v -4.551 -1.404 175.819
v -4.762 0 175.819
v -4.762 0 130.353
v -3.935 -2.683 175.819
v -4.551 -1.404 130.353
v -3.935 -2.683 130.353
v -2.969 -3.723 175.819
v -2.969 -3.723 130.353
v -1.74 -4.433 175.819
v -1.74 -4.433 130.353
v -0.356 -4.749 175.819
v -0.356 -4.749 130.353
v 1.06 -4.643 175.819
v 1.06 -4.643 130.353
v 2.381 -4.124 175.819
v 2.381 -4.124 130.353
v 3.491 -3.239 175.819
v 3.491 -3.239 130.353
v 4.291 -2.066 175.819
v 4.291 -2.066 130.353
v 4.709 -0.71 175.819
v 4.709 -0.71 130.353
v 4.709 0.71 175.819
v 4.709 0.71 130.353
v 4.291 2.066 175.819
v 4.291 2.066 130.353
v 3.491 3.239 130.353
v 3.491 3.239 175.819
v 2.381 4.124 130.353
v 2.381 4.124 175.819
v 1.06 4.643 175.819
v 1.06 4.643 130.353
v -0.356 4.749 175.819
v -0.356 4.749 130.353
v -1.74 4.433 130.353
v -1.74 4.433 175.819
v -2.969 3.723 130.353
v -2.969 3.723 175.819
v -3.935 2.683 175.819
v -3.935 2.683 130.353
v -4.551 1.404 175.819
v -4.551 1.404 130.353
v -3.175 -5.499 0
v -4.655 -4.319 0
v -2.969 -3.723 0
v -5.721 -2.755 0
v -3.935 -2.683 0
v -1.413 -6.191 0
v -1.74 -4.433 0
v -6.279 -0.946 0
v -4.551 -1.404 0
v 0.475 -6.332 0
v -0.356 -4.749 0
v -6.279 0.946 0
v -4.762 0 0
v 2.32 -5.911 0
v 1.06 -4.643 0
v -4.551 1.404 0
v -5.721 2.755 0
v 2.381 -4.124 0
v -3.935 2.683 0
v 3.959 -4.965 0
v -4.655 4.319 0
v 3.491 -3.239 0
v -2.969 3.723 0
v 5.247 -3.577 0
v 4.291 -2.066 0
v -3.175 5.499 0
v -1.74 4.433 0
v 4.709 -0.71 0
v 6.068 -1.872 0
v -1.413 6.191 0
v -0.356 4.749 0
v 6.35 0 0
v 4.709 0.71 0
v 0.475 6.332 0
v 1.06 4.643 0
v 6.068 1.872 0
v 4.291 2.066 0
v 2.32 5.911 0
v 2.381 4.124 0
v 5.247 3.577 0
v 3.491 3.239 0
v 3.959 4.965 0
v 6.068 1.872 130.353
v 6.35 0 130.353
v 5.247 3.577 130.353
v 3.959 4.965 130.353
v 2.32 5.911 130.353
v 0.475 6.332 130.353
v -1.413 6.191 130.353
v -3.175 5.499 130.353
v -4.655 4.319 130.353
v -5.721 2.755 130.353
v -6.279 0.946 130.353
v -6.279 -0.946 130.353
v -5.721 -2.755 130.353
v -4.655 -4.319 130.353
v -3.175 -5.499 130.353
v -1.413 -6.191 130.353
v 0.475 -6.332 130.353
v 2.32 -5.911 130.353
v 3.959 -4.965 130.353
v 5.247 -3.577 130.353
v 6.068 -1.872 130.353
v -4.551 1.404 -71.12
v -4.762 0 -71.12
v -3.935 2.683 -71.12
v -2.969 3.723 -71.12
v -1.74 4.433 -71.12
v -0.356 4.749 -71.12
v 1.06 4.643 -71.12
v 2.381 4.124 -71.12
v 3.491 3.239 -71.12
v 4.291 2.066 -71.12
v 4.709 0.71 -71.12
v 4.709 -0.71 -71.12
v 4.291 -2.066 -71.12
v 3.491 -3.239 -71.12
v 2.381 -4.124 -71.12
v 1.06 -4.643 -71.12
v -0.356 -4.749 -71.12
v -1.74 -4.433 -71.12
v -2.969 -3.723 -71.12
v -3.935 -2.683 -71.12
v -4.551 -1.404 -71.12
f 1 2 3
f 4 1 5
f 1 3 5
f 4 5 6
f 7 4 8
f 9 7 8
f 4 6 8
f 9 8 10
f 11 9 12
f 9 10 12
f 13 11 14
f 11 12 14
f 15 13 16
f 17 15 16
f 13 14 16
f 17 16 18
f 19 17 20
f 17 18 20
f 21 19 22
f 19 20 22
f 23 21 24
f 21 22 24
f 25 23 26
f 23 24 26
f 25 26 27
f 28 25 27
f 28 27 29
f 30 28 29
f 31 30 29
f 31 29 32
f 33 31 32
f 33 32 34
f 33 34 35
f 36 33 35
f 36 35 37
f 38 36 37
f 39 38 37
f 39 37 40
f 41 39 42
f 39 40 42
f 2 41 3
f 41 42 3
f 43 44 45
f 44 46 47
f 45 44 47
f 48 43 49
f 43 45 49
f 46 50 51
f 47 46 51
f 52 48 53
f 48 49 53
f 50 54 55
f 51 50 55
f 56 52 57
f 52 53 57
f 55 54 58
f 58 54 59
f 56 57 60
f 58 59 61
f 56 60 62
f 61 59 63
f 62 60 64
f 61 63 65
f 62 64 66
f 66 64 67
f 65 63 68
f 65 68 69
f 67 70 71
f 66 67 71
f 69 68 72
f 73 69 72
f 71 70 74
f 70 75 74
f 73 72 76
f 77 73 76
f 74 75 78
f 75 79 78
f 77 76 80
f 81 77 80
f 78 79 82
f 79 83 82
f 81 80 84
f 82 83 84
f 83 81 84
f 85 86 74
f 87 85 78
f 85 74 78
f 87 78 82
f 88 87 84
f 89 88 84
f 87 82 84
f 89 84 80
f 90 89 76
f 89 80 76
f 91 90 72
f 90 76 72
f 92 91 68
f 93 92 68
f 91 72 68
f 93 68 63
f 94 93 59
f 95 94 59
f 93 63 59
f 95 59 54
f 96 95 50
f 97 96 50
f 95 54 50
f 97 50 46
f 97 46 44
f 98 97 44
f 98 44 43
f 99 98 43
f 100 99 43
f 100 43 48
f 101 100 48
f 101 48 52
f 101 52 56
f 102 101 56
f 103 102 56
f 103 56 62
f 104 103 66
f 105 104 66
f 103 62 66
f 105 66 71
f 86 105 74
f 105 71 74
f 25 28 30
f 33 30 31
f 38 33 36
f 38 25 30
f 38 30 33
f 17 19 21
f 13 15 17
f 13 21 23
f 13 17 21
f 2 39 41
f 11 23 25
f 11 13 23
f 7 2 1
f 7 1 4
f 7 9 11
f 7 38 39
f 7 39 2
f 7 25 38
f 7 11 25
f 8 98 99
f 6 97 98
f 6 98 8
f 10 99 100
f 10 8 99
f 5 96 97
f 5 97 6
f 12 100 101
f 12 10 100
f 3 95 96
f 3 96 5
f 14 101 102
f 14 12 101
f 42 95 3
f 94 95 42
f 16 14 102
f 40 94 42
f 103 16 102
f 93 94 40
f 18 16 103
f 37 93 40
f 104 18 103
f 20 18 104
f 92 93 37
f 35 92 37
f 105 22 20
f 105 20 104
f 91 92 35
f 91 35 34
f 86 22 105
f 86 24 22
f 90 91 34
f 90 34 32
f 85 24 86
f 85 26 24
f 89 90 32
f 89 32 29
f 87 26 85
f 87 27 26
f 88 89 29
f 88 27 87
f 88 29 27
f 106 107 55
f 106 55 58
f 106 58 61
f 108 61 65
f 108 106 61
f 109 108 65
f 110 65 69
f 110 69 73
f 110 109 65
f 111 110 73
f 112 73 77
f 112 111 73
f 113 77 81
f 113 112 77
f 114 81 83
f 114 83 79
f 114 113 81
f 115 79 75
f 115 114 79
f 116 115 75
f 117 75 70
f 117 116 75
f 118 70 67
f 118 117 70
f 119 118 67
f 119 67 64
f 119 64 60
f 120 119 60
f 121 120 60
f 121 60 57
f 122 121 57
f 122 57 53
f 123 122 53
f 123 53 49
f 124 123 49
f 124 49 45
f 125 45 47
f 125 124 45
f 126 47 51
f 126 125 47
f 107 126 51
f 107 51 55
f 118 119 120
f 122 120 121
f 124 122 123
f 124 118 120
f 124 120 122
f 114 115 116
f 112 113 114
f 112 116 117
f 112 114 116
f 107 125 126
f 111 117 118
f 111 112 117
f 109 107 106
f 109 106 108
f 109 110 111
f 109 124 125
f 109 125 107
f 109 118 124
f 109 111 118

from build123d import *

# Parameters (mm, degrees)
SKETCH1_R           = 6.35
BOSS_EXTRUDE1_DEPTH = 130.3528
SKETCH2_R           = 4.7625
BOSS_EXTRUDE2_DEPTH = 45.466
BOSS_EXTRUDE3_START = 71.12
SKETCH3_R           = 4.7625
BOSS_EXTRUDE3_DEPTH = 71.12


with BuildPart() as part:
    # Sketch1 → Boss-Extrude1 (new body)
    with BuildSketch(Plane.XY):
        Circle(SKETCH1_R)
    extrude(amount=BOSS_EXTRUDE1_DEPTH)

    # Sketch2 → Boss-Extrude2 (add)
    with BuildSketch(Plane.XY.offset(130.3528)):
        with Locations(Location((0, 0, 0), (0, 0, 180))):
            Circle(SKETCH2_R)
    extrude(amount=BOSS_EXTRUDE2_DEPTH)

    # Sketch3 → Boss-Extrude3 (add)
    with BuildSketch(Plane(origin=(0, 0, 0), x_dir=(-1, 0, 0), z_dir=(0, 0, -1)).offset(BOSS_EXTRUDE3_START)):
        Circle(SKETCH3_R)
    extrude(amount=-BOSS_EXTRUDE3_DEPTH)


solid = part.part
